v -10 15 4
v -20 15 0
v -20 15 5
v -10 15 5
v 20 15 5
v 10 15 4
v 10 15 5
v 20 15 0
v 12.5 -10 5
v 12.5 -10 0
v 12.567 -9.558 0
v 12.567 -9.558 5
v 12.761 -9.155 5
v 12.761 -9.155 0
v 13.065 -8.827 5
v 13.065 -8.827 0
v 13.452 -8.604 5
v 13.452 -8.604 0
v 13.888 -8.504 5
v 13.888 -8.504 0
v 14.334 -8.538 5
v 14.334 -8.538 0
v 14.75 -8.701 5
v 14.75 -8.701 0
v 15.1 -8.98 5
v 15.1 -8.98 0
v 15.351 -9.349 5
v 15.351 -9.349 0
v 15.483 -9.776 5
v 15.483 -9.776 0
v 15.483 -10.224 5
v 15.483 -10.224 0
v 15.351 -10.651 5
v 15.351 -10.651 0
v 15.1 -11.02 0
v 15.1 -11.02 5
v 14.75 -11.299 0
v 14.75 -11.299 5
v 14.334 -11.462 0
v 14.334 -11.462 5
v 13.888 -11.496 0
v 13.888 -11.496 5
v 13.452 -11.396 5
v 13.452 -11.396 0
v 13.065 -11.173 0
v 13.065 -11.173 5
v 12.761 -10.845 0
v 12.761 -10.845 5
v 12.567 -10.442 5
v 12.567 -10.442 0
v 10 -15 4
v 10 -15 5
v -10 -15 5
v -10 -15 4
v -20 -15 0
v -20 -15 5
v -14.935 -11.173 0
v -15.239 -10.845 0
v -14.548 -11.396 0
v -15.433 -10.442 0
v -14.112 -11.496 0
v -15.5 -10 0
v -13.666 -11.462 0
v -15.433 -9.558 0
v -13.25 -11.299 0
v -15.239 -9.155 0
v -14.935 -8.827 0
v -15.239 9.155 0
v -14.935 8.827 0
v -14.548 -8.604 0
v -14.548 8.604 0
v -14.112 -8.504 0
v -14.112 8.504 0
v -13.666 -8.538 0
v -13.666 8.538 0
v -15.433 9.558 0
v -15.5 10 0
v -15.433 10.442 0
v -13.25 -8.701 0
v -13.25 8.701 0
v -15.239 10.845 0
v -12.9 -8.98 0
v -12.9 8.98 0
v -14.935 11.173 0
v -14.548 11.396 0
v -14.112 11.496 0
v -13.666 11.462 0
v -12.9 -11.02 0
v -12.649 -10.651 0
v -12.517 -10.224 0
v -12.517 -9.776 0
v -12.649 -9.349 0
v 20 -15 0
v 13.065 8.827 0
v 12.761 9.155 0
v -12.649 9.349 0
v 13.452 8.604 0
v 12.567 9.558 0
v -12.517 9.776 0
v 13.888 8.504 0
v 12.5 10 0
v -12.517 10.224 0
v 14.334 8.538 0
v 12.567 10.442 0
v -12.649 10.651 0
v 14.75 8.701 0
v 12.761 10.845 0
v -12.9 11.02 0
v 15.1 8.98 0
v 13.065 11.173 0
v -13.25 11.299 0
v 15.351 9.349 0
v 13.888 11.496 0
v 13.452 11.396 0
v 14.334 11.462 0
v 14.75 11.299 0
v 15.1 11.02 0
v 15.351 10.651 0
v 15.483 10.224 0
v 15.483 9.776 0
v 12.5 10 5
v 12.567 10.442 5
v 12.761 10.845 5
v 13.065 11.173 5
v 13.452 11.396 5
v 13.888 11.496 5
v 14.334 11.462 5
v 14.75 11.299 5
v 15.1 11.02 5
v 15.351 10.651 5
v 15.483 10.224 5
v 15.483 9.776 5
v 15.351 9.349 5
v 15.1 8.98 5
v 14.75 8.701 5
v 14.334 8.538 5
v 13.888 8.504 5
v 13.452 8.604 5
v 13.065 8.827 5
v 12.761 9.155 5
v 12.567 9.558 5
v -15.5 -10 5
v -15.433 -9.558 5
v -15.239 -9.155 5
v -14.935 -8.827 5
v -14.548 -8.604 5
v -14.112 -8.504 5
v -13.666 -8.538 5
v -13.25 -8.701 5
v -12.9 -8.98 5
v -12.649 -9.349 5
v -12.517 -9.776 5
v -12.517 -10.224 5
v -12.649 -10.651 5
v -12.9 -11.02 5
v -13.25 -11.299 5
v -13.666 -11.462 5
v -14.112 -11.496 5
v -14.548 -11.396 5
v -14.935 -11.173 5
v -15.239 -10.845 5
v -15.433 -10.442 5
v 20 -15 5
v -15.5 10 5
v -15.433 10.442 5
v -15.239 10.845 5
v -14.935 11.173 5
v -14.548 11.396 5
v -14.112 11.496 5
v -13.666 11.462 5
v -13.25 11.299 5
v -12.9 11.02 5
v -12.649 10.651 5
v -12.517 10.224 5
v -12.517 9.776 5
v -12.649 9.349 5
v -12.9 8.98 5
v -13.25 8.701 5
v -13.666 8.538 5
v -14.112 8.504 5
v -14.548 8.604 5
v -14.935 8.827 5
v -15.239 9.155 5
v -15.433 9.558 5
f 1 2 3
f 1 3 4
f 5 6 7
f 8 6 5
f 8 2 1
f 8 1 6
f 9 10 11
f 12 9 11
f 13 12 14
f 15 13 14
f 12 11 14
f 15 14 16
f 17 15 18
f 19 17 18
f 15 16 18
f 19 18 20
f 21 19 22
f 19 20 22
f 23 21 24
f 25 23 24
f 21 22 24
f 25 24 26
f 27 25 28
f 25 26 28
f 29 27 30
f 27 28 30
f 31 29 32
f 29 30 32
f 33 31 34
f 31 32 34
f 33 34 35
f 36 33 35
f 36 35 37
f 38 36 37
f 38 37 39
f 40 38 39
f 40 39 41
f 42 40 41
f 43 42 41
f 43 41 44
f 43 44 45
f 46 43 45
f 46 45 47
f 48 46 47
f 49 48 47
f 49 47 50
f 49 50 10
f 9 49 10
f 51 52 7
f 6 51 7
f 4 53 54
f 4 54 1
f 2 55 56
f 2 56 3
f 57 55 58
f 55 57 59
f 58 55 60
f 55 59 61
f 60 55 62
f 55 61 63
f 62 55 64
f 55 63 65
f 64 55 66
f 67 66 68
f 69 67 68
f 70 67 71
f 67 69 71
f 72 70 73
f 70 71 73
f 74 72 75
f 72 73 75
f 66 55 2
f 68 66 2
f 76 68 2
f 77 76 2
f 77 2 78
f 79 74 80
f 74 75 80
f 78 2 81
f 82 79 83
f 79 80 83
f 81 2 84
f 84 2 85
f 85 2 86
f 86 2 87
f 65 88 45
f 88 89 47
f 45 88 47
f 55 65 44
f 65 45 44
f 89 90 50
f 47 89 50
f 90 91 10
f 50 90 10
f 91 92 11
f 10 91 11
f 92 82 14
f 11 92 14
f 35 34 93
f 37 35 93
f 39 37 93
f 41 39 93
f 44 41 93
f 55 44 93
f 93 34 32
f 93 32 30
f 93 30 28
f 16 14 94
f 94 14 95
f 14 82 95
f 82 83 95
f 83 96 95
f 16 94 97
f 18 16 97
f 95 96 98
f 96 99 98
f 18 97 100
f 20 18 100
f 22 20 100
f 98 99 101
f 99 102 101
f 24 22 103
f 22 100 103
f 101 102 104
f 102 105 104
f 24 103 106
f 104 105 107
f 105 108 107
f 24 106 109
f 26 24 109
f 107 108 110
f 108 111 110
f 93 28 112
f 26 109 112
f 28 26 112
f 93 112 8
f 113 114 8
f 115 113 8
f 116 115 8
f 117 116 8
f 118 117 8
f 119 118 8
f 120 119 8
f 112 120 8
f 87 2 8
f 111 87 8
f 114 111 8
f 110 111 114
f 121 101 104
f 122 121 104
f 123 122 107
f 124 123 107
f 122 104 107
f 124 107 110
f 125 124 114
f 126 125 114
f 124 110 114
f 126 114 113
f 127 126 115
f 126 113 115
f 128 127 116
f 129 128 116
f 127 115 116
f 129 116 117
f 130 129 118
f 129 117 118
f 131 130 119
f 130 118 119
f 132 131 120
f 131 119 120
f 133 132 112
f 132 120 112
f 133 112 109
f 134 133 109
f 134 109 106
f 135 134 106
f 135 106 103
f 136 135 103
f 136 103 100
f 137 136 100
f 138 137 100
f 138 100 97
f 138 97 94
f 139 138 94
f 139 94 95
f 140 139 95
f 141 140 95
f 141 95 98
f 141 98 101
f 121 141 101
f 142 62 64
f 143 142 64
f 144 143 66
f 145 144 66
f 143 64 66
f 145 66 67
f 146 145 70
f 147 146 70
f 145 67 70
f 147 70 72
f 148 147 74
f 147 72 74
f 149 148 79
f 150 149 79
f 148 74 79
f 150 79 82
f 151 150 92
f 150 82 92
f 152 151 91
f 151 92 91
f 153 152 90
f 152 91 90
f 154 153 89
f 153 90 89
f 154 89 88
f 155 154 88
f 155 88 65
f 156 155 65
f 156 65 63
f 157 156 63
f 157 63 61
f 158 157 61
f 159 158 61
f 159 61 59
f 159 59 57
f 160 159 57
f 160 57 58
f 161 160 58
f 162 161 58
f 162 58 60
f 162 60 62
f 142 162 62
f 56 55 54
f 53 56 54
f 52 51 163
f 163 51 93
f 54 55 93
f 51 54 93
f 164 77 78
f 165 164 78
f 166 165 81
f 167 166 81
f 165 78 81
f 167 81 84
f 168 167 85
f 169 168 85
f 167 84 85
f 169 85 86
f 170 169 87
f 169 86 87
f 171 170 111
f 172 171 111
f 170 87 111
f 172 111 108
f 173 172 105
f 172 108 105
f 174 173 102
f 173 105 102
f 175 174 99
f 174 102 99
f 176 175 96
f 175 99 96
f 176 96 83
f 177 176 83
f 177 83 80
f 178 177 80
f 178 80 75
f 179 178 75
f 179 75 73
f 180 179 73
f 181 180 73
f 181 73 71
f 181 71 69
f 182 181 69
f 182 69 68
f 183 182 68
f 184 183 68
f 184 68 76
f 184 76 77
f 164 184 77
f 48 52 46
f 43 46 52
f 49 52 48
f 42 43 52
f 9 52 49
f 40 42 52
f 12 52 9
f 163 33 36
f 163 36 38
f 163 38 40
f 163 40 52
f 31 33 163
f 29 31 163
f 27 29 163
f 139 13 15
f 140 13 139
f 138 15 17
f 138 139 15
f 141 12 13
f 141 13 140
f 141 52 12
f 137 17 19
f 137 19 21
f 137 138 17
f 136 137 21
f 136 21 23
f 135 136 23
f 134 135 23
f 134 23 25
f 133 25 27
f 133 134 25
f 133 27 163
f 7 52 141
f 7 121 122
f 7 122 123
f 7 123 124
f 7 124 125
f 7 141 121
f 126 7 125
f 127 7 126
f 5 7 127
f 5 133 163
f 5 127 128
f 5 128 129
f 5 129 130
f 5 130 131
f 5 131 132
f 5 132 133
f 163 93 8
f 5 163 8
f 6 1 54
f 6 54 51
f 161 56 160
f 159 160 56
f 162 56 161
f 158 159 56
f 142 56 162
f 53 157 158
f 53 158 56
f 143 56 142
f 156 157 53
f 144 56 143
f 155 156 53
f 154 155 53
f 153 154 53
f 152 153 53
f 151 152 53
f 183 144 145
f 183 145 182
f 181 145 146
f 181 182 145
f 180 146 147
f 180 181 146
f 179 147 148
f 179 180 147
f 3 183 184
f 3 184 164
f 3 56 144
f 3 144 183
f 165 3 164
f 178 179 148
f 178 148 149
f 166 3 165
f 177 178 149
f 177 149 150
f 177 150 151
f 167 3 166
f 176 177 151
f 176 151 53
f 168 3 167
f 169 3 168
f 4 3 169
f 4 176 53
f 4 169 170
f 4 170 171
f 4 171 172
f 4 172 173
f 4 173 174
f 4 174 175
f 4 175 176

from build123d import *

# Parameters (mm, degrees)
SKETCH_1_W          = 40
SKETCH_1_H          = 30
EXTRUDE_1_DEPTH     = 5
SKETCH_2_R          = 1.5
CUT_EXTRUDE_1_DEPTH = 10
SKETCH_3_W          = 20
SKETCH_3_H          = 30
CUT_EXTRUDE_2_DEPTH = 1


with BuildPart() as part:
    # 草图1 → 凸台-拉伸1 (new body)
    with BuildSketch(Plane.XY):
        Rectangle(SKETCH_1_W, SKETCH_1_H)
    extrude(amount=EXTRUDE_1_DEPTH)

    # 草图2 → 切除-拉伸1 (cut)
    with BuildSketch(Plane(origin=(0, 0, 0), x_dir=(-1, 0, 0), z_dir=(0, 0, -1))):
        with Locations((14, 10)):
            Circle(SKETCH_2_R)
        with Locations((-14, 10)):
            Circle(SKETCH_2_R)
        with Locations((-14, -10)):
            Circle(SKETCH_2_R)
        with Locations((14, -10)):
            Circle(SKETCH_2_R)
    extrude(amount=-CUT_EXTRUDE_1_DEPTH, mode=Mode.SUBTRACT)

    # 草图3 → 切除-拉伸2 (cut)
    with BuildSketch(Plane.XY.offset(5)):
        Rectangle(SKETCH_3_W, SKETCH_3_H)
    extrude(amount=-CUT_EXTRUDE_2_DEPTH, mode=Mode.SUBTRACT)


solid = part.part
